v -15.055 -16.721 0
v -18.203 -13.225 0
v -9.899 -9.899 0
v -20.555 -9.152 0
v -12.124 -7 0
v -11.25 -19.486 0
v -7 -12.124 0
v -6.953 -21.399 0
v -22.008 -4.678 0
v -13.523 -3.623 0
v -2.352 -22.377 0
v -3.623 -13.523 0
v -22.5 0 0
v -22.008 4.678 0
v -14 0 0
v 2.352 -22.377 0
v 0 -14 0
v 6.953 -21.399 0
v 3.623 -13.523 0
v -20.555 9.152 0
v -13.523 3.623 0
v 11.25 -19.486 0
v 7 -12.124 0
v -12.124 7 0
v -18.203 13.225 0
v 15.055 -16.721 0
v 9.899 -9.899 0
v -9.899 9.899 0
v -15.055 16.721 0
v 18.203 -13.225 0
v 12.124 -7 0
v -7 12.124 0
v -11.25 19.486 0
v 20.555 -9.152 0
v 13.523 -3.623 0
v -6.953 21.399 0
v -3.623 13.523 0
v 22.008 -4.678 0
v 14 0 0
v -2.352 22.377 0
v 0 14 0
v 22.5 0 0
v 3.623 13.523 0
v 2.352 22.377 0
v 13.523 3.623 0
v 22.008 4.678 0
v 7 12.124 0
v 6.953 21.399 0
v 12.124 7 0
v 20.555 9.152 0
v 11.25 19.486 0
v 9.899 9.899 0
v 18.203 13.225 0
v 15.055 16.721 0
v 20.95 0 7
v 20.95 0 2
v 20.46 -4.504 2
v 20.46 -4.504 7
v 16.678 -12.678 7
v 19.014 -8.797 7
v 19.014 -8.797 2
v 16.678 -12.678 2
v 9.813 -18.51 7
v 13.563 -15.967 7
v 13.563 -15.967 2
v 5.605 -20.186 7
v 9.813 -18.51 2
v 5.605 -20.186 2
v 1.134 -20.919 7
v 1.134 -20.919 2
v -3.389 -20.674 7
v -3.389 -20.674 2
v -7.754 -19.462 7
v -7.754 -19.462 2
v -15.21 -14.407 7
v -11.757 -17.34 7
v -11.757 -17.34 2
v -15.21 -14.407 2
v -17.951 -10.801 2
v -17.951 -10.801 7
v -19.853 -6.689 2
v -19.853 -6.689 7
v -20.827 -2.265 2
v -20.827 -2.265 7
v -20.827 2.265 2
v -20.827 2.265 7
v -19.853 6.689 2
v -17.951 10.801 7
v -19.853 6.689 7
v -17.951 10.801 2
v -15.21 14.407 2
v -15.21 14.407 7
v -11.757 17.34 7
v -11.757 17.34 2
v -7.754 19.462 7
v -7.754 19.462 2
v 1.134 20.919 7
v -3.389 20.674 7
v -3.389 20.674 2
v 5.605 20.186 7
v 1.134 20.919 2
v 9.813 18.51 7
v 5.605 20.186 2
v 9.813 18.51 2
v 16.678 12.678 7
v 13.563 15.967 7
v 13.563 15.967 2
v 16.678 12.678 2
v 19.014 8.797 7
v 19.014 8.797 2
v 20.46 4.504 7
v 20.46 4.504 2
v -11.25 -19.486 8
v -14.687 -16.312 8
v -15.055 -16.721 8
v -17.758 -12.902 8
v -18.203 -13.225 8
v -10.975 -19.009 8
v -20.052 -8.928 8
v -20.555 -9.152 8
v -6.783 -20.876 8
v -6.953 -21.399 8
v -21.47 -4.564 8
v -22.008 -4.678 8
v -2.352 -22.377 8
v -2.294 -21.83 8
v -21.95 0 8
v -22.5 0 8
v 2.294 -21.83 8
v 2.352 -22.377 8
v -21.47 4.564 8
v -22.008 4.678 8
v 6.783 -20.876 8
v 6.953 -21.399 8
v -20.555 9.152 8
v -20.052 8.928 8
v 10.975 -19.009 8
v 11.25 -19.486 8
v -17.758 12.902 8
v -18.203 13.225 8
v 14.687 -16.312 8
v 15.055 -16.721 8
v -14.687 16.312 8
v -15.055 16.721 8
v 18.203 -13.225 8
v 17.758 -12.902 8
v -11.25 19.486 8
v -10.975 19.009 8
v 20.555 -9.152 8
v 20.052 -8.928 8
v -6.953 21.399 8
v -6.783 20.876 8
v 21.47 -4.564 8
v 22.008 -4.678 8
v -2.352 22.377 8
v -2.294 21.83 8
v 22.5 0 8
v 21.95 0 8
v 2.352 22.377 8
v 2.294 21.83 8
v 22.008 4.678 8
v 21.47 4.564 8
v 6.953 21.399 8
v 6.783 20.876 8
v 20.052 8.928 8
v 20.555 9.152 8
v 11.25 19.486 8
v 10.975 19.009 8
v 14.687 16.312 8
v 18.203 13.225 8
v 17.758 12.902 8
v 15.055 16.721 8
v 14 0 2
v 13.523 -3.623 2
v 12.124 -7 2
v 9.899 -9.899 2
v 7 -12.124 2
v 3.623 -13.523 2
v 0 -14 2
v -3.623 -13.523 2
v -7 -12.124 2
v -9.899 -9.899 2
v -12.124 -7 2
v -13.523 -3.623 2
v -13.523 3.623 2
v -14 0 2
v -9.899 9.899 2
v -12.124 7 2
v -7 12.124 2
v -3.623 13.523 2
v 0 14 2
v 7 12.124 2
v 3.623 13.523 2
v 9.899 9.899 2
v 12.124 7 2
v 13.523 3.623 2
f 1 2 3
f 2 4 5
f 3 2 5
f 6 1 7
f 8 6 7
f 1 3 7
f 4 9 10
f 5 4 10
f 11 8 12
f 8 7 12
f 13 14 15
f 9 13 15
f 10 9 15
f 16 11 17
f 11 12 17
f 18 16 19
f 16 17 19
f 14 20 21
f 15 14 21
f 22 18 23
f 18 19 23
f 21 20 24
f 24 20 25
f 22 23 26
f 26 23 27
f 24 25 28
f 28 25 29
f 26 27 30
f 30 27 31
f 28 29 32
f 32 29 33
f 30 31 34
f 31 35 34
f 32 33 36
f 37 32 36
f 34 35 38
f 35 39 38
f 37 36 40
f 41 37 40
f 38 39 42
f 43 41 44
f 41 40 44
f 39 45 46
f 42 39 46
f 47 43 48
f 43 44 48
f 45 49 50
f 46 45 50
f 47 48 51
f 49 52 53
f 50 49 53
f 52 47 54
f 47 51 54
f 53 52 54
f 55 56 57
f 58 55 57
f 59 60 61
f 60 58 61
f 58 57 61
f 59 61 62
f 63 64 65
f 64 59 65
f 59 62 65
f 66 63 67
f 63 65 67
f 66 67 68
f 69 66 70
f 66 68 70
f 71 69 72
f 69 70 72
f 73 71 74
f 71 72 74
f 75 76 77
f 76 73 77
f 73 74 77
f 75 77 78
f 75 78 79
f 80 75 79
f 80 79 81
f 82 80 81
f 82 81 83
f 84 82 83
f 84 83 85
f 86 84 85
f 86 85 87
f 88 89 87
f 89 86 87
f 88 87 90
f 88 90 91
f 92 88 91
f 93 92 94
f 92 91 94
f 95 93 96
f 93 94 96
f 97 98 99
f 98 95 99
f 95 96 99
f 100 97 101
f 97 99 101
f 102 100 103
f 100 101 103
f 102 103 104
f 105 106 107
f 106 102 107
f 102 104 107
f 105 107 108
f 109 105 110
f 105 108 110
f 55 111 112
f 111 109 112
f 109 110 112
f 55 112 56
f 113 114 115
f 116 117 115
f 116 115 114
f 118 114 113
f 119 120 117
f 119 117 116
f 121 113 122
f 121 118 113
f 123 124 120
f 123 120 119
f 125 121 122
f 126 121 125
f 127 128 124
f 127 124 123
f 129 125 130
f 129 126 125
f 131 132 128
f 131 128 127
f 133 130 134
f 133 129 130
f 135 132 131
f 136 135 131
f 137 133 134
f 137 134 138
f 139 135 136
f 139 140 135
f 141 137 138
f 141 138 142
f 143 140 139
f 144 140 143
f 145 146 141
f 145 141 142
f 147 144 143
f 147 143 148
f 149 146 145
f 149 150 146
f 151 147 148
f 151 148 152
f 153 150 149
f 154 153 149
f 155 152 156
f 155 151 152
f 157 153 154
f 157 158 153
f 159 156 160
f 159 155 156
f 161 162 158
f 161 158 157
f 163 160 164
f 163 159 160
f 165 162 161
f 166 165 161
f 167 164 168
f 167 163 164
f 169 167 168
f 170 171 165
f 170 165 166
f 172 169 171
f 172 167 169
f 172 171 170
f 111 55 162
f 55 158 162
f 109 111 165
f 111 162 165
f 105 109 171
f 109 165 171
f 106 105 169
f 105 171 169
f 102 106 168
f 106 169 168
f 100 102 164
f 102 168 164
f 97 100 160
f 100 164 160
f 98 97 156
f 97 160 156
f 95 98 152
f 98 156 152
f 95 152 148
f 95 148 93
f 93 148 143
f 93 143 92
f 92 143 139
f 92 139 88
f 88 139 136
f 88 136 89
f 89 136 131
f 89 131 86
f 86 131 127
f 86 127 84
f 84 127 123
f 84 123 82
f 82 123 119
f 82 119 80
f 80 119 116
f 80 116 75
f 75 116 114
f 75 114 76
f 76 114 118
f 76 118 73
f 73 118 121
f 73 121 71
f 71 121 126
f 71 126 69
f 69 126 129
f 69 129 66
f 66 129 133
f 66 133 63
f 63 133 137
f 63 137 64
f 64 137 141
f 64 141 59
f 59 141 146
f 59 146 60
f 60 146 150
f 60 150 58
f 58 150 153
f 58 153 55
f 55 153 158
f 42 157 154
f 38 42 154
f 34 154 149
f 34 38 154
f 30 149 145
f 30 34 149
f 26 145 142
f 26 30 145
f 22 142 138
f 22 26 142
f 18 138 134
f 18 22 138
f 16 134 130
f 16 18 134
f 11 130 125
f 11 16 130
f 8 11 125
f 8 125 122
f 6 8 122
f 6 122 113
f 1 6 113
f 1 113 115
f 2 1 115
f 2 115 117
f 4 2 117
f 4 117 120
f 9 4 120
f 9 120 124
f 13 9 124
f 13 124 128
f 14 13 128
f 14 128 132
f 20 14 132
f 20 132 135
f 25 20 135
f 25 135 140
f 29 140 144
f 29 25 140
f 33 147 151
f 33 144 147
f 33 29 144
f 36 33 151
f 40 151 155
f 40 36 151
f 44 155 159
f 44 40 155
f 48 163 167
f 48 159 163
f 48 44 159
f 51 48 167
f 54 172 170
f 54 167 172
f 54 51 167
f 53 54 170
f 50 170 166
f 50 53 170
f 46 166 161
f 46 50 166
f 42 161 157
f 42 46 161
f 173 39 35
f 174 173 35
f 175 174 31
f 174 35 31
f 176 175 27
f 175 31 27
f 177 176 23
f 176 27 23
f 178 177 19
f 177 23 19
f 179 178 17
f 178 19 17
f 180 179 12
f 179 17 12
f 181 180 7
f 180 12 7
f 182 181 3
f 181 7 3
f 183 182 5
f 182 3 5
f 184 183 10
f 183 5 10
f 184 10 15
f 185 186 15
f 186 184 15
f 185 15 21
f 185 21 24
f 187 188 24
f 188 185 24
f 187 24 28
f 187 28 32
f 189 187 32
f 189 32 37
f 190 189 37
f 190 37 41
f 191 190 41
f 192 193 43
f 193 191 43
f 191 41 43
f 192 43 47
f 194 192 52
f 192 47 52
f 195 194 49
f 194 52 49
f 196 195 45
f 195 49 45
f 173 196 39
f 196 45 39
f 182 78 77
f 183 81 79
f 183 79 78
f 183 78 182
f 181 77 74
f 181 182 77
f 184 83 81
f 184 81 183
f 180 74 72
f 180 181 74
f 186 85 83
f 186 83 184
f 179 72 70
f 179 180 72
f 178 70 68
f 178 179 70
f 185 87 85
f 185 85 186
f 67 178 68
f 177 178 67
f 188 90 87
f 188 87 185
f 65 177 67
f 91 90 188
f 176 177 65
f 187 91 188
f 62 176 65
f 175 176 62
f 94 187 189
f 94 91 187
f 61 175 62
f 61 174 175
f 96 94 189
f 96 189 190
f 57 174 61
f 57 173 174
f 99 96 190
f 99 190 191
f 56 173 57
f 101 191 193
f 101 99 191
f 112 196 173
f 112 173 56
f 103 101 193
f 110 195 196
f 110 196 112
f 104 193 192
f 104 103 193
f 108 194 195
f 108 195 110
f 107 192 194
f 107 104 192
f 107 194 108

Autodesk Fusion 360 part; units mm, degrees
sketch "Sketch1" plane through (0, 0, 0) normal (0, 0, 1) x (1, 0, 0)
  circle A0 centre (0, 0) radius 22.5
  circle A1 centre (0, 0) radius 20.95
  circle A2 centre (0, 0) radius 14
  dimension "d1" = 45
  dimension "d2" = 41.9
  dimension "d3" = 28
extrude "Extrude1" add sketch "Sketch1" along normal blind 8 contours A0
extrude "Extrude2" add sketch "Sketch1" along normal blind 2 contours A1
chamfer "Chamfer1" distance 1 angle 45 1 edges at (-19.5323, 7.5758, 8)
